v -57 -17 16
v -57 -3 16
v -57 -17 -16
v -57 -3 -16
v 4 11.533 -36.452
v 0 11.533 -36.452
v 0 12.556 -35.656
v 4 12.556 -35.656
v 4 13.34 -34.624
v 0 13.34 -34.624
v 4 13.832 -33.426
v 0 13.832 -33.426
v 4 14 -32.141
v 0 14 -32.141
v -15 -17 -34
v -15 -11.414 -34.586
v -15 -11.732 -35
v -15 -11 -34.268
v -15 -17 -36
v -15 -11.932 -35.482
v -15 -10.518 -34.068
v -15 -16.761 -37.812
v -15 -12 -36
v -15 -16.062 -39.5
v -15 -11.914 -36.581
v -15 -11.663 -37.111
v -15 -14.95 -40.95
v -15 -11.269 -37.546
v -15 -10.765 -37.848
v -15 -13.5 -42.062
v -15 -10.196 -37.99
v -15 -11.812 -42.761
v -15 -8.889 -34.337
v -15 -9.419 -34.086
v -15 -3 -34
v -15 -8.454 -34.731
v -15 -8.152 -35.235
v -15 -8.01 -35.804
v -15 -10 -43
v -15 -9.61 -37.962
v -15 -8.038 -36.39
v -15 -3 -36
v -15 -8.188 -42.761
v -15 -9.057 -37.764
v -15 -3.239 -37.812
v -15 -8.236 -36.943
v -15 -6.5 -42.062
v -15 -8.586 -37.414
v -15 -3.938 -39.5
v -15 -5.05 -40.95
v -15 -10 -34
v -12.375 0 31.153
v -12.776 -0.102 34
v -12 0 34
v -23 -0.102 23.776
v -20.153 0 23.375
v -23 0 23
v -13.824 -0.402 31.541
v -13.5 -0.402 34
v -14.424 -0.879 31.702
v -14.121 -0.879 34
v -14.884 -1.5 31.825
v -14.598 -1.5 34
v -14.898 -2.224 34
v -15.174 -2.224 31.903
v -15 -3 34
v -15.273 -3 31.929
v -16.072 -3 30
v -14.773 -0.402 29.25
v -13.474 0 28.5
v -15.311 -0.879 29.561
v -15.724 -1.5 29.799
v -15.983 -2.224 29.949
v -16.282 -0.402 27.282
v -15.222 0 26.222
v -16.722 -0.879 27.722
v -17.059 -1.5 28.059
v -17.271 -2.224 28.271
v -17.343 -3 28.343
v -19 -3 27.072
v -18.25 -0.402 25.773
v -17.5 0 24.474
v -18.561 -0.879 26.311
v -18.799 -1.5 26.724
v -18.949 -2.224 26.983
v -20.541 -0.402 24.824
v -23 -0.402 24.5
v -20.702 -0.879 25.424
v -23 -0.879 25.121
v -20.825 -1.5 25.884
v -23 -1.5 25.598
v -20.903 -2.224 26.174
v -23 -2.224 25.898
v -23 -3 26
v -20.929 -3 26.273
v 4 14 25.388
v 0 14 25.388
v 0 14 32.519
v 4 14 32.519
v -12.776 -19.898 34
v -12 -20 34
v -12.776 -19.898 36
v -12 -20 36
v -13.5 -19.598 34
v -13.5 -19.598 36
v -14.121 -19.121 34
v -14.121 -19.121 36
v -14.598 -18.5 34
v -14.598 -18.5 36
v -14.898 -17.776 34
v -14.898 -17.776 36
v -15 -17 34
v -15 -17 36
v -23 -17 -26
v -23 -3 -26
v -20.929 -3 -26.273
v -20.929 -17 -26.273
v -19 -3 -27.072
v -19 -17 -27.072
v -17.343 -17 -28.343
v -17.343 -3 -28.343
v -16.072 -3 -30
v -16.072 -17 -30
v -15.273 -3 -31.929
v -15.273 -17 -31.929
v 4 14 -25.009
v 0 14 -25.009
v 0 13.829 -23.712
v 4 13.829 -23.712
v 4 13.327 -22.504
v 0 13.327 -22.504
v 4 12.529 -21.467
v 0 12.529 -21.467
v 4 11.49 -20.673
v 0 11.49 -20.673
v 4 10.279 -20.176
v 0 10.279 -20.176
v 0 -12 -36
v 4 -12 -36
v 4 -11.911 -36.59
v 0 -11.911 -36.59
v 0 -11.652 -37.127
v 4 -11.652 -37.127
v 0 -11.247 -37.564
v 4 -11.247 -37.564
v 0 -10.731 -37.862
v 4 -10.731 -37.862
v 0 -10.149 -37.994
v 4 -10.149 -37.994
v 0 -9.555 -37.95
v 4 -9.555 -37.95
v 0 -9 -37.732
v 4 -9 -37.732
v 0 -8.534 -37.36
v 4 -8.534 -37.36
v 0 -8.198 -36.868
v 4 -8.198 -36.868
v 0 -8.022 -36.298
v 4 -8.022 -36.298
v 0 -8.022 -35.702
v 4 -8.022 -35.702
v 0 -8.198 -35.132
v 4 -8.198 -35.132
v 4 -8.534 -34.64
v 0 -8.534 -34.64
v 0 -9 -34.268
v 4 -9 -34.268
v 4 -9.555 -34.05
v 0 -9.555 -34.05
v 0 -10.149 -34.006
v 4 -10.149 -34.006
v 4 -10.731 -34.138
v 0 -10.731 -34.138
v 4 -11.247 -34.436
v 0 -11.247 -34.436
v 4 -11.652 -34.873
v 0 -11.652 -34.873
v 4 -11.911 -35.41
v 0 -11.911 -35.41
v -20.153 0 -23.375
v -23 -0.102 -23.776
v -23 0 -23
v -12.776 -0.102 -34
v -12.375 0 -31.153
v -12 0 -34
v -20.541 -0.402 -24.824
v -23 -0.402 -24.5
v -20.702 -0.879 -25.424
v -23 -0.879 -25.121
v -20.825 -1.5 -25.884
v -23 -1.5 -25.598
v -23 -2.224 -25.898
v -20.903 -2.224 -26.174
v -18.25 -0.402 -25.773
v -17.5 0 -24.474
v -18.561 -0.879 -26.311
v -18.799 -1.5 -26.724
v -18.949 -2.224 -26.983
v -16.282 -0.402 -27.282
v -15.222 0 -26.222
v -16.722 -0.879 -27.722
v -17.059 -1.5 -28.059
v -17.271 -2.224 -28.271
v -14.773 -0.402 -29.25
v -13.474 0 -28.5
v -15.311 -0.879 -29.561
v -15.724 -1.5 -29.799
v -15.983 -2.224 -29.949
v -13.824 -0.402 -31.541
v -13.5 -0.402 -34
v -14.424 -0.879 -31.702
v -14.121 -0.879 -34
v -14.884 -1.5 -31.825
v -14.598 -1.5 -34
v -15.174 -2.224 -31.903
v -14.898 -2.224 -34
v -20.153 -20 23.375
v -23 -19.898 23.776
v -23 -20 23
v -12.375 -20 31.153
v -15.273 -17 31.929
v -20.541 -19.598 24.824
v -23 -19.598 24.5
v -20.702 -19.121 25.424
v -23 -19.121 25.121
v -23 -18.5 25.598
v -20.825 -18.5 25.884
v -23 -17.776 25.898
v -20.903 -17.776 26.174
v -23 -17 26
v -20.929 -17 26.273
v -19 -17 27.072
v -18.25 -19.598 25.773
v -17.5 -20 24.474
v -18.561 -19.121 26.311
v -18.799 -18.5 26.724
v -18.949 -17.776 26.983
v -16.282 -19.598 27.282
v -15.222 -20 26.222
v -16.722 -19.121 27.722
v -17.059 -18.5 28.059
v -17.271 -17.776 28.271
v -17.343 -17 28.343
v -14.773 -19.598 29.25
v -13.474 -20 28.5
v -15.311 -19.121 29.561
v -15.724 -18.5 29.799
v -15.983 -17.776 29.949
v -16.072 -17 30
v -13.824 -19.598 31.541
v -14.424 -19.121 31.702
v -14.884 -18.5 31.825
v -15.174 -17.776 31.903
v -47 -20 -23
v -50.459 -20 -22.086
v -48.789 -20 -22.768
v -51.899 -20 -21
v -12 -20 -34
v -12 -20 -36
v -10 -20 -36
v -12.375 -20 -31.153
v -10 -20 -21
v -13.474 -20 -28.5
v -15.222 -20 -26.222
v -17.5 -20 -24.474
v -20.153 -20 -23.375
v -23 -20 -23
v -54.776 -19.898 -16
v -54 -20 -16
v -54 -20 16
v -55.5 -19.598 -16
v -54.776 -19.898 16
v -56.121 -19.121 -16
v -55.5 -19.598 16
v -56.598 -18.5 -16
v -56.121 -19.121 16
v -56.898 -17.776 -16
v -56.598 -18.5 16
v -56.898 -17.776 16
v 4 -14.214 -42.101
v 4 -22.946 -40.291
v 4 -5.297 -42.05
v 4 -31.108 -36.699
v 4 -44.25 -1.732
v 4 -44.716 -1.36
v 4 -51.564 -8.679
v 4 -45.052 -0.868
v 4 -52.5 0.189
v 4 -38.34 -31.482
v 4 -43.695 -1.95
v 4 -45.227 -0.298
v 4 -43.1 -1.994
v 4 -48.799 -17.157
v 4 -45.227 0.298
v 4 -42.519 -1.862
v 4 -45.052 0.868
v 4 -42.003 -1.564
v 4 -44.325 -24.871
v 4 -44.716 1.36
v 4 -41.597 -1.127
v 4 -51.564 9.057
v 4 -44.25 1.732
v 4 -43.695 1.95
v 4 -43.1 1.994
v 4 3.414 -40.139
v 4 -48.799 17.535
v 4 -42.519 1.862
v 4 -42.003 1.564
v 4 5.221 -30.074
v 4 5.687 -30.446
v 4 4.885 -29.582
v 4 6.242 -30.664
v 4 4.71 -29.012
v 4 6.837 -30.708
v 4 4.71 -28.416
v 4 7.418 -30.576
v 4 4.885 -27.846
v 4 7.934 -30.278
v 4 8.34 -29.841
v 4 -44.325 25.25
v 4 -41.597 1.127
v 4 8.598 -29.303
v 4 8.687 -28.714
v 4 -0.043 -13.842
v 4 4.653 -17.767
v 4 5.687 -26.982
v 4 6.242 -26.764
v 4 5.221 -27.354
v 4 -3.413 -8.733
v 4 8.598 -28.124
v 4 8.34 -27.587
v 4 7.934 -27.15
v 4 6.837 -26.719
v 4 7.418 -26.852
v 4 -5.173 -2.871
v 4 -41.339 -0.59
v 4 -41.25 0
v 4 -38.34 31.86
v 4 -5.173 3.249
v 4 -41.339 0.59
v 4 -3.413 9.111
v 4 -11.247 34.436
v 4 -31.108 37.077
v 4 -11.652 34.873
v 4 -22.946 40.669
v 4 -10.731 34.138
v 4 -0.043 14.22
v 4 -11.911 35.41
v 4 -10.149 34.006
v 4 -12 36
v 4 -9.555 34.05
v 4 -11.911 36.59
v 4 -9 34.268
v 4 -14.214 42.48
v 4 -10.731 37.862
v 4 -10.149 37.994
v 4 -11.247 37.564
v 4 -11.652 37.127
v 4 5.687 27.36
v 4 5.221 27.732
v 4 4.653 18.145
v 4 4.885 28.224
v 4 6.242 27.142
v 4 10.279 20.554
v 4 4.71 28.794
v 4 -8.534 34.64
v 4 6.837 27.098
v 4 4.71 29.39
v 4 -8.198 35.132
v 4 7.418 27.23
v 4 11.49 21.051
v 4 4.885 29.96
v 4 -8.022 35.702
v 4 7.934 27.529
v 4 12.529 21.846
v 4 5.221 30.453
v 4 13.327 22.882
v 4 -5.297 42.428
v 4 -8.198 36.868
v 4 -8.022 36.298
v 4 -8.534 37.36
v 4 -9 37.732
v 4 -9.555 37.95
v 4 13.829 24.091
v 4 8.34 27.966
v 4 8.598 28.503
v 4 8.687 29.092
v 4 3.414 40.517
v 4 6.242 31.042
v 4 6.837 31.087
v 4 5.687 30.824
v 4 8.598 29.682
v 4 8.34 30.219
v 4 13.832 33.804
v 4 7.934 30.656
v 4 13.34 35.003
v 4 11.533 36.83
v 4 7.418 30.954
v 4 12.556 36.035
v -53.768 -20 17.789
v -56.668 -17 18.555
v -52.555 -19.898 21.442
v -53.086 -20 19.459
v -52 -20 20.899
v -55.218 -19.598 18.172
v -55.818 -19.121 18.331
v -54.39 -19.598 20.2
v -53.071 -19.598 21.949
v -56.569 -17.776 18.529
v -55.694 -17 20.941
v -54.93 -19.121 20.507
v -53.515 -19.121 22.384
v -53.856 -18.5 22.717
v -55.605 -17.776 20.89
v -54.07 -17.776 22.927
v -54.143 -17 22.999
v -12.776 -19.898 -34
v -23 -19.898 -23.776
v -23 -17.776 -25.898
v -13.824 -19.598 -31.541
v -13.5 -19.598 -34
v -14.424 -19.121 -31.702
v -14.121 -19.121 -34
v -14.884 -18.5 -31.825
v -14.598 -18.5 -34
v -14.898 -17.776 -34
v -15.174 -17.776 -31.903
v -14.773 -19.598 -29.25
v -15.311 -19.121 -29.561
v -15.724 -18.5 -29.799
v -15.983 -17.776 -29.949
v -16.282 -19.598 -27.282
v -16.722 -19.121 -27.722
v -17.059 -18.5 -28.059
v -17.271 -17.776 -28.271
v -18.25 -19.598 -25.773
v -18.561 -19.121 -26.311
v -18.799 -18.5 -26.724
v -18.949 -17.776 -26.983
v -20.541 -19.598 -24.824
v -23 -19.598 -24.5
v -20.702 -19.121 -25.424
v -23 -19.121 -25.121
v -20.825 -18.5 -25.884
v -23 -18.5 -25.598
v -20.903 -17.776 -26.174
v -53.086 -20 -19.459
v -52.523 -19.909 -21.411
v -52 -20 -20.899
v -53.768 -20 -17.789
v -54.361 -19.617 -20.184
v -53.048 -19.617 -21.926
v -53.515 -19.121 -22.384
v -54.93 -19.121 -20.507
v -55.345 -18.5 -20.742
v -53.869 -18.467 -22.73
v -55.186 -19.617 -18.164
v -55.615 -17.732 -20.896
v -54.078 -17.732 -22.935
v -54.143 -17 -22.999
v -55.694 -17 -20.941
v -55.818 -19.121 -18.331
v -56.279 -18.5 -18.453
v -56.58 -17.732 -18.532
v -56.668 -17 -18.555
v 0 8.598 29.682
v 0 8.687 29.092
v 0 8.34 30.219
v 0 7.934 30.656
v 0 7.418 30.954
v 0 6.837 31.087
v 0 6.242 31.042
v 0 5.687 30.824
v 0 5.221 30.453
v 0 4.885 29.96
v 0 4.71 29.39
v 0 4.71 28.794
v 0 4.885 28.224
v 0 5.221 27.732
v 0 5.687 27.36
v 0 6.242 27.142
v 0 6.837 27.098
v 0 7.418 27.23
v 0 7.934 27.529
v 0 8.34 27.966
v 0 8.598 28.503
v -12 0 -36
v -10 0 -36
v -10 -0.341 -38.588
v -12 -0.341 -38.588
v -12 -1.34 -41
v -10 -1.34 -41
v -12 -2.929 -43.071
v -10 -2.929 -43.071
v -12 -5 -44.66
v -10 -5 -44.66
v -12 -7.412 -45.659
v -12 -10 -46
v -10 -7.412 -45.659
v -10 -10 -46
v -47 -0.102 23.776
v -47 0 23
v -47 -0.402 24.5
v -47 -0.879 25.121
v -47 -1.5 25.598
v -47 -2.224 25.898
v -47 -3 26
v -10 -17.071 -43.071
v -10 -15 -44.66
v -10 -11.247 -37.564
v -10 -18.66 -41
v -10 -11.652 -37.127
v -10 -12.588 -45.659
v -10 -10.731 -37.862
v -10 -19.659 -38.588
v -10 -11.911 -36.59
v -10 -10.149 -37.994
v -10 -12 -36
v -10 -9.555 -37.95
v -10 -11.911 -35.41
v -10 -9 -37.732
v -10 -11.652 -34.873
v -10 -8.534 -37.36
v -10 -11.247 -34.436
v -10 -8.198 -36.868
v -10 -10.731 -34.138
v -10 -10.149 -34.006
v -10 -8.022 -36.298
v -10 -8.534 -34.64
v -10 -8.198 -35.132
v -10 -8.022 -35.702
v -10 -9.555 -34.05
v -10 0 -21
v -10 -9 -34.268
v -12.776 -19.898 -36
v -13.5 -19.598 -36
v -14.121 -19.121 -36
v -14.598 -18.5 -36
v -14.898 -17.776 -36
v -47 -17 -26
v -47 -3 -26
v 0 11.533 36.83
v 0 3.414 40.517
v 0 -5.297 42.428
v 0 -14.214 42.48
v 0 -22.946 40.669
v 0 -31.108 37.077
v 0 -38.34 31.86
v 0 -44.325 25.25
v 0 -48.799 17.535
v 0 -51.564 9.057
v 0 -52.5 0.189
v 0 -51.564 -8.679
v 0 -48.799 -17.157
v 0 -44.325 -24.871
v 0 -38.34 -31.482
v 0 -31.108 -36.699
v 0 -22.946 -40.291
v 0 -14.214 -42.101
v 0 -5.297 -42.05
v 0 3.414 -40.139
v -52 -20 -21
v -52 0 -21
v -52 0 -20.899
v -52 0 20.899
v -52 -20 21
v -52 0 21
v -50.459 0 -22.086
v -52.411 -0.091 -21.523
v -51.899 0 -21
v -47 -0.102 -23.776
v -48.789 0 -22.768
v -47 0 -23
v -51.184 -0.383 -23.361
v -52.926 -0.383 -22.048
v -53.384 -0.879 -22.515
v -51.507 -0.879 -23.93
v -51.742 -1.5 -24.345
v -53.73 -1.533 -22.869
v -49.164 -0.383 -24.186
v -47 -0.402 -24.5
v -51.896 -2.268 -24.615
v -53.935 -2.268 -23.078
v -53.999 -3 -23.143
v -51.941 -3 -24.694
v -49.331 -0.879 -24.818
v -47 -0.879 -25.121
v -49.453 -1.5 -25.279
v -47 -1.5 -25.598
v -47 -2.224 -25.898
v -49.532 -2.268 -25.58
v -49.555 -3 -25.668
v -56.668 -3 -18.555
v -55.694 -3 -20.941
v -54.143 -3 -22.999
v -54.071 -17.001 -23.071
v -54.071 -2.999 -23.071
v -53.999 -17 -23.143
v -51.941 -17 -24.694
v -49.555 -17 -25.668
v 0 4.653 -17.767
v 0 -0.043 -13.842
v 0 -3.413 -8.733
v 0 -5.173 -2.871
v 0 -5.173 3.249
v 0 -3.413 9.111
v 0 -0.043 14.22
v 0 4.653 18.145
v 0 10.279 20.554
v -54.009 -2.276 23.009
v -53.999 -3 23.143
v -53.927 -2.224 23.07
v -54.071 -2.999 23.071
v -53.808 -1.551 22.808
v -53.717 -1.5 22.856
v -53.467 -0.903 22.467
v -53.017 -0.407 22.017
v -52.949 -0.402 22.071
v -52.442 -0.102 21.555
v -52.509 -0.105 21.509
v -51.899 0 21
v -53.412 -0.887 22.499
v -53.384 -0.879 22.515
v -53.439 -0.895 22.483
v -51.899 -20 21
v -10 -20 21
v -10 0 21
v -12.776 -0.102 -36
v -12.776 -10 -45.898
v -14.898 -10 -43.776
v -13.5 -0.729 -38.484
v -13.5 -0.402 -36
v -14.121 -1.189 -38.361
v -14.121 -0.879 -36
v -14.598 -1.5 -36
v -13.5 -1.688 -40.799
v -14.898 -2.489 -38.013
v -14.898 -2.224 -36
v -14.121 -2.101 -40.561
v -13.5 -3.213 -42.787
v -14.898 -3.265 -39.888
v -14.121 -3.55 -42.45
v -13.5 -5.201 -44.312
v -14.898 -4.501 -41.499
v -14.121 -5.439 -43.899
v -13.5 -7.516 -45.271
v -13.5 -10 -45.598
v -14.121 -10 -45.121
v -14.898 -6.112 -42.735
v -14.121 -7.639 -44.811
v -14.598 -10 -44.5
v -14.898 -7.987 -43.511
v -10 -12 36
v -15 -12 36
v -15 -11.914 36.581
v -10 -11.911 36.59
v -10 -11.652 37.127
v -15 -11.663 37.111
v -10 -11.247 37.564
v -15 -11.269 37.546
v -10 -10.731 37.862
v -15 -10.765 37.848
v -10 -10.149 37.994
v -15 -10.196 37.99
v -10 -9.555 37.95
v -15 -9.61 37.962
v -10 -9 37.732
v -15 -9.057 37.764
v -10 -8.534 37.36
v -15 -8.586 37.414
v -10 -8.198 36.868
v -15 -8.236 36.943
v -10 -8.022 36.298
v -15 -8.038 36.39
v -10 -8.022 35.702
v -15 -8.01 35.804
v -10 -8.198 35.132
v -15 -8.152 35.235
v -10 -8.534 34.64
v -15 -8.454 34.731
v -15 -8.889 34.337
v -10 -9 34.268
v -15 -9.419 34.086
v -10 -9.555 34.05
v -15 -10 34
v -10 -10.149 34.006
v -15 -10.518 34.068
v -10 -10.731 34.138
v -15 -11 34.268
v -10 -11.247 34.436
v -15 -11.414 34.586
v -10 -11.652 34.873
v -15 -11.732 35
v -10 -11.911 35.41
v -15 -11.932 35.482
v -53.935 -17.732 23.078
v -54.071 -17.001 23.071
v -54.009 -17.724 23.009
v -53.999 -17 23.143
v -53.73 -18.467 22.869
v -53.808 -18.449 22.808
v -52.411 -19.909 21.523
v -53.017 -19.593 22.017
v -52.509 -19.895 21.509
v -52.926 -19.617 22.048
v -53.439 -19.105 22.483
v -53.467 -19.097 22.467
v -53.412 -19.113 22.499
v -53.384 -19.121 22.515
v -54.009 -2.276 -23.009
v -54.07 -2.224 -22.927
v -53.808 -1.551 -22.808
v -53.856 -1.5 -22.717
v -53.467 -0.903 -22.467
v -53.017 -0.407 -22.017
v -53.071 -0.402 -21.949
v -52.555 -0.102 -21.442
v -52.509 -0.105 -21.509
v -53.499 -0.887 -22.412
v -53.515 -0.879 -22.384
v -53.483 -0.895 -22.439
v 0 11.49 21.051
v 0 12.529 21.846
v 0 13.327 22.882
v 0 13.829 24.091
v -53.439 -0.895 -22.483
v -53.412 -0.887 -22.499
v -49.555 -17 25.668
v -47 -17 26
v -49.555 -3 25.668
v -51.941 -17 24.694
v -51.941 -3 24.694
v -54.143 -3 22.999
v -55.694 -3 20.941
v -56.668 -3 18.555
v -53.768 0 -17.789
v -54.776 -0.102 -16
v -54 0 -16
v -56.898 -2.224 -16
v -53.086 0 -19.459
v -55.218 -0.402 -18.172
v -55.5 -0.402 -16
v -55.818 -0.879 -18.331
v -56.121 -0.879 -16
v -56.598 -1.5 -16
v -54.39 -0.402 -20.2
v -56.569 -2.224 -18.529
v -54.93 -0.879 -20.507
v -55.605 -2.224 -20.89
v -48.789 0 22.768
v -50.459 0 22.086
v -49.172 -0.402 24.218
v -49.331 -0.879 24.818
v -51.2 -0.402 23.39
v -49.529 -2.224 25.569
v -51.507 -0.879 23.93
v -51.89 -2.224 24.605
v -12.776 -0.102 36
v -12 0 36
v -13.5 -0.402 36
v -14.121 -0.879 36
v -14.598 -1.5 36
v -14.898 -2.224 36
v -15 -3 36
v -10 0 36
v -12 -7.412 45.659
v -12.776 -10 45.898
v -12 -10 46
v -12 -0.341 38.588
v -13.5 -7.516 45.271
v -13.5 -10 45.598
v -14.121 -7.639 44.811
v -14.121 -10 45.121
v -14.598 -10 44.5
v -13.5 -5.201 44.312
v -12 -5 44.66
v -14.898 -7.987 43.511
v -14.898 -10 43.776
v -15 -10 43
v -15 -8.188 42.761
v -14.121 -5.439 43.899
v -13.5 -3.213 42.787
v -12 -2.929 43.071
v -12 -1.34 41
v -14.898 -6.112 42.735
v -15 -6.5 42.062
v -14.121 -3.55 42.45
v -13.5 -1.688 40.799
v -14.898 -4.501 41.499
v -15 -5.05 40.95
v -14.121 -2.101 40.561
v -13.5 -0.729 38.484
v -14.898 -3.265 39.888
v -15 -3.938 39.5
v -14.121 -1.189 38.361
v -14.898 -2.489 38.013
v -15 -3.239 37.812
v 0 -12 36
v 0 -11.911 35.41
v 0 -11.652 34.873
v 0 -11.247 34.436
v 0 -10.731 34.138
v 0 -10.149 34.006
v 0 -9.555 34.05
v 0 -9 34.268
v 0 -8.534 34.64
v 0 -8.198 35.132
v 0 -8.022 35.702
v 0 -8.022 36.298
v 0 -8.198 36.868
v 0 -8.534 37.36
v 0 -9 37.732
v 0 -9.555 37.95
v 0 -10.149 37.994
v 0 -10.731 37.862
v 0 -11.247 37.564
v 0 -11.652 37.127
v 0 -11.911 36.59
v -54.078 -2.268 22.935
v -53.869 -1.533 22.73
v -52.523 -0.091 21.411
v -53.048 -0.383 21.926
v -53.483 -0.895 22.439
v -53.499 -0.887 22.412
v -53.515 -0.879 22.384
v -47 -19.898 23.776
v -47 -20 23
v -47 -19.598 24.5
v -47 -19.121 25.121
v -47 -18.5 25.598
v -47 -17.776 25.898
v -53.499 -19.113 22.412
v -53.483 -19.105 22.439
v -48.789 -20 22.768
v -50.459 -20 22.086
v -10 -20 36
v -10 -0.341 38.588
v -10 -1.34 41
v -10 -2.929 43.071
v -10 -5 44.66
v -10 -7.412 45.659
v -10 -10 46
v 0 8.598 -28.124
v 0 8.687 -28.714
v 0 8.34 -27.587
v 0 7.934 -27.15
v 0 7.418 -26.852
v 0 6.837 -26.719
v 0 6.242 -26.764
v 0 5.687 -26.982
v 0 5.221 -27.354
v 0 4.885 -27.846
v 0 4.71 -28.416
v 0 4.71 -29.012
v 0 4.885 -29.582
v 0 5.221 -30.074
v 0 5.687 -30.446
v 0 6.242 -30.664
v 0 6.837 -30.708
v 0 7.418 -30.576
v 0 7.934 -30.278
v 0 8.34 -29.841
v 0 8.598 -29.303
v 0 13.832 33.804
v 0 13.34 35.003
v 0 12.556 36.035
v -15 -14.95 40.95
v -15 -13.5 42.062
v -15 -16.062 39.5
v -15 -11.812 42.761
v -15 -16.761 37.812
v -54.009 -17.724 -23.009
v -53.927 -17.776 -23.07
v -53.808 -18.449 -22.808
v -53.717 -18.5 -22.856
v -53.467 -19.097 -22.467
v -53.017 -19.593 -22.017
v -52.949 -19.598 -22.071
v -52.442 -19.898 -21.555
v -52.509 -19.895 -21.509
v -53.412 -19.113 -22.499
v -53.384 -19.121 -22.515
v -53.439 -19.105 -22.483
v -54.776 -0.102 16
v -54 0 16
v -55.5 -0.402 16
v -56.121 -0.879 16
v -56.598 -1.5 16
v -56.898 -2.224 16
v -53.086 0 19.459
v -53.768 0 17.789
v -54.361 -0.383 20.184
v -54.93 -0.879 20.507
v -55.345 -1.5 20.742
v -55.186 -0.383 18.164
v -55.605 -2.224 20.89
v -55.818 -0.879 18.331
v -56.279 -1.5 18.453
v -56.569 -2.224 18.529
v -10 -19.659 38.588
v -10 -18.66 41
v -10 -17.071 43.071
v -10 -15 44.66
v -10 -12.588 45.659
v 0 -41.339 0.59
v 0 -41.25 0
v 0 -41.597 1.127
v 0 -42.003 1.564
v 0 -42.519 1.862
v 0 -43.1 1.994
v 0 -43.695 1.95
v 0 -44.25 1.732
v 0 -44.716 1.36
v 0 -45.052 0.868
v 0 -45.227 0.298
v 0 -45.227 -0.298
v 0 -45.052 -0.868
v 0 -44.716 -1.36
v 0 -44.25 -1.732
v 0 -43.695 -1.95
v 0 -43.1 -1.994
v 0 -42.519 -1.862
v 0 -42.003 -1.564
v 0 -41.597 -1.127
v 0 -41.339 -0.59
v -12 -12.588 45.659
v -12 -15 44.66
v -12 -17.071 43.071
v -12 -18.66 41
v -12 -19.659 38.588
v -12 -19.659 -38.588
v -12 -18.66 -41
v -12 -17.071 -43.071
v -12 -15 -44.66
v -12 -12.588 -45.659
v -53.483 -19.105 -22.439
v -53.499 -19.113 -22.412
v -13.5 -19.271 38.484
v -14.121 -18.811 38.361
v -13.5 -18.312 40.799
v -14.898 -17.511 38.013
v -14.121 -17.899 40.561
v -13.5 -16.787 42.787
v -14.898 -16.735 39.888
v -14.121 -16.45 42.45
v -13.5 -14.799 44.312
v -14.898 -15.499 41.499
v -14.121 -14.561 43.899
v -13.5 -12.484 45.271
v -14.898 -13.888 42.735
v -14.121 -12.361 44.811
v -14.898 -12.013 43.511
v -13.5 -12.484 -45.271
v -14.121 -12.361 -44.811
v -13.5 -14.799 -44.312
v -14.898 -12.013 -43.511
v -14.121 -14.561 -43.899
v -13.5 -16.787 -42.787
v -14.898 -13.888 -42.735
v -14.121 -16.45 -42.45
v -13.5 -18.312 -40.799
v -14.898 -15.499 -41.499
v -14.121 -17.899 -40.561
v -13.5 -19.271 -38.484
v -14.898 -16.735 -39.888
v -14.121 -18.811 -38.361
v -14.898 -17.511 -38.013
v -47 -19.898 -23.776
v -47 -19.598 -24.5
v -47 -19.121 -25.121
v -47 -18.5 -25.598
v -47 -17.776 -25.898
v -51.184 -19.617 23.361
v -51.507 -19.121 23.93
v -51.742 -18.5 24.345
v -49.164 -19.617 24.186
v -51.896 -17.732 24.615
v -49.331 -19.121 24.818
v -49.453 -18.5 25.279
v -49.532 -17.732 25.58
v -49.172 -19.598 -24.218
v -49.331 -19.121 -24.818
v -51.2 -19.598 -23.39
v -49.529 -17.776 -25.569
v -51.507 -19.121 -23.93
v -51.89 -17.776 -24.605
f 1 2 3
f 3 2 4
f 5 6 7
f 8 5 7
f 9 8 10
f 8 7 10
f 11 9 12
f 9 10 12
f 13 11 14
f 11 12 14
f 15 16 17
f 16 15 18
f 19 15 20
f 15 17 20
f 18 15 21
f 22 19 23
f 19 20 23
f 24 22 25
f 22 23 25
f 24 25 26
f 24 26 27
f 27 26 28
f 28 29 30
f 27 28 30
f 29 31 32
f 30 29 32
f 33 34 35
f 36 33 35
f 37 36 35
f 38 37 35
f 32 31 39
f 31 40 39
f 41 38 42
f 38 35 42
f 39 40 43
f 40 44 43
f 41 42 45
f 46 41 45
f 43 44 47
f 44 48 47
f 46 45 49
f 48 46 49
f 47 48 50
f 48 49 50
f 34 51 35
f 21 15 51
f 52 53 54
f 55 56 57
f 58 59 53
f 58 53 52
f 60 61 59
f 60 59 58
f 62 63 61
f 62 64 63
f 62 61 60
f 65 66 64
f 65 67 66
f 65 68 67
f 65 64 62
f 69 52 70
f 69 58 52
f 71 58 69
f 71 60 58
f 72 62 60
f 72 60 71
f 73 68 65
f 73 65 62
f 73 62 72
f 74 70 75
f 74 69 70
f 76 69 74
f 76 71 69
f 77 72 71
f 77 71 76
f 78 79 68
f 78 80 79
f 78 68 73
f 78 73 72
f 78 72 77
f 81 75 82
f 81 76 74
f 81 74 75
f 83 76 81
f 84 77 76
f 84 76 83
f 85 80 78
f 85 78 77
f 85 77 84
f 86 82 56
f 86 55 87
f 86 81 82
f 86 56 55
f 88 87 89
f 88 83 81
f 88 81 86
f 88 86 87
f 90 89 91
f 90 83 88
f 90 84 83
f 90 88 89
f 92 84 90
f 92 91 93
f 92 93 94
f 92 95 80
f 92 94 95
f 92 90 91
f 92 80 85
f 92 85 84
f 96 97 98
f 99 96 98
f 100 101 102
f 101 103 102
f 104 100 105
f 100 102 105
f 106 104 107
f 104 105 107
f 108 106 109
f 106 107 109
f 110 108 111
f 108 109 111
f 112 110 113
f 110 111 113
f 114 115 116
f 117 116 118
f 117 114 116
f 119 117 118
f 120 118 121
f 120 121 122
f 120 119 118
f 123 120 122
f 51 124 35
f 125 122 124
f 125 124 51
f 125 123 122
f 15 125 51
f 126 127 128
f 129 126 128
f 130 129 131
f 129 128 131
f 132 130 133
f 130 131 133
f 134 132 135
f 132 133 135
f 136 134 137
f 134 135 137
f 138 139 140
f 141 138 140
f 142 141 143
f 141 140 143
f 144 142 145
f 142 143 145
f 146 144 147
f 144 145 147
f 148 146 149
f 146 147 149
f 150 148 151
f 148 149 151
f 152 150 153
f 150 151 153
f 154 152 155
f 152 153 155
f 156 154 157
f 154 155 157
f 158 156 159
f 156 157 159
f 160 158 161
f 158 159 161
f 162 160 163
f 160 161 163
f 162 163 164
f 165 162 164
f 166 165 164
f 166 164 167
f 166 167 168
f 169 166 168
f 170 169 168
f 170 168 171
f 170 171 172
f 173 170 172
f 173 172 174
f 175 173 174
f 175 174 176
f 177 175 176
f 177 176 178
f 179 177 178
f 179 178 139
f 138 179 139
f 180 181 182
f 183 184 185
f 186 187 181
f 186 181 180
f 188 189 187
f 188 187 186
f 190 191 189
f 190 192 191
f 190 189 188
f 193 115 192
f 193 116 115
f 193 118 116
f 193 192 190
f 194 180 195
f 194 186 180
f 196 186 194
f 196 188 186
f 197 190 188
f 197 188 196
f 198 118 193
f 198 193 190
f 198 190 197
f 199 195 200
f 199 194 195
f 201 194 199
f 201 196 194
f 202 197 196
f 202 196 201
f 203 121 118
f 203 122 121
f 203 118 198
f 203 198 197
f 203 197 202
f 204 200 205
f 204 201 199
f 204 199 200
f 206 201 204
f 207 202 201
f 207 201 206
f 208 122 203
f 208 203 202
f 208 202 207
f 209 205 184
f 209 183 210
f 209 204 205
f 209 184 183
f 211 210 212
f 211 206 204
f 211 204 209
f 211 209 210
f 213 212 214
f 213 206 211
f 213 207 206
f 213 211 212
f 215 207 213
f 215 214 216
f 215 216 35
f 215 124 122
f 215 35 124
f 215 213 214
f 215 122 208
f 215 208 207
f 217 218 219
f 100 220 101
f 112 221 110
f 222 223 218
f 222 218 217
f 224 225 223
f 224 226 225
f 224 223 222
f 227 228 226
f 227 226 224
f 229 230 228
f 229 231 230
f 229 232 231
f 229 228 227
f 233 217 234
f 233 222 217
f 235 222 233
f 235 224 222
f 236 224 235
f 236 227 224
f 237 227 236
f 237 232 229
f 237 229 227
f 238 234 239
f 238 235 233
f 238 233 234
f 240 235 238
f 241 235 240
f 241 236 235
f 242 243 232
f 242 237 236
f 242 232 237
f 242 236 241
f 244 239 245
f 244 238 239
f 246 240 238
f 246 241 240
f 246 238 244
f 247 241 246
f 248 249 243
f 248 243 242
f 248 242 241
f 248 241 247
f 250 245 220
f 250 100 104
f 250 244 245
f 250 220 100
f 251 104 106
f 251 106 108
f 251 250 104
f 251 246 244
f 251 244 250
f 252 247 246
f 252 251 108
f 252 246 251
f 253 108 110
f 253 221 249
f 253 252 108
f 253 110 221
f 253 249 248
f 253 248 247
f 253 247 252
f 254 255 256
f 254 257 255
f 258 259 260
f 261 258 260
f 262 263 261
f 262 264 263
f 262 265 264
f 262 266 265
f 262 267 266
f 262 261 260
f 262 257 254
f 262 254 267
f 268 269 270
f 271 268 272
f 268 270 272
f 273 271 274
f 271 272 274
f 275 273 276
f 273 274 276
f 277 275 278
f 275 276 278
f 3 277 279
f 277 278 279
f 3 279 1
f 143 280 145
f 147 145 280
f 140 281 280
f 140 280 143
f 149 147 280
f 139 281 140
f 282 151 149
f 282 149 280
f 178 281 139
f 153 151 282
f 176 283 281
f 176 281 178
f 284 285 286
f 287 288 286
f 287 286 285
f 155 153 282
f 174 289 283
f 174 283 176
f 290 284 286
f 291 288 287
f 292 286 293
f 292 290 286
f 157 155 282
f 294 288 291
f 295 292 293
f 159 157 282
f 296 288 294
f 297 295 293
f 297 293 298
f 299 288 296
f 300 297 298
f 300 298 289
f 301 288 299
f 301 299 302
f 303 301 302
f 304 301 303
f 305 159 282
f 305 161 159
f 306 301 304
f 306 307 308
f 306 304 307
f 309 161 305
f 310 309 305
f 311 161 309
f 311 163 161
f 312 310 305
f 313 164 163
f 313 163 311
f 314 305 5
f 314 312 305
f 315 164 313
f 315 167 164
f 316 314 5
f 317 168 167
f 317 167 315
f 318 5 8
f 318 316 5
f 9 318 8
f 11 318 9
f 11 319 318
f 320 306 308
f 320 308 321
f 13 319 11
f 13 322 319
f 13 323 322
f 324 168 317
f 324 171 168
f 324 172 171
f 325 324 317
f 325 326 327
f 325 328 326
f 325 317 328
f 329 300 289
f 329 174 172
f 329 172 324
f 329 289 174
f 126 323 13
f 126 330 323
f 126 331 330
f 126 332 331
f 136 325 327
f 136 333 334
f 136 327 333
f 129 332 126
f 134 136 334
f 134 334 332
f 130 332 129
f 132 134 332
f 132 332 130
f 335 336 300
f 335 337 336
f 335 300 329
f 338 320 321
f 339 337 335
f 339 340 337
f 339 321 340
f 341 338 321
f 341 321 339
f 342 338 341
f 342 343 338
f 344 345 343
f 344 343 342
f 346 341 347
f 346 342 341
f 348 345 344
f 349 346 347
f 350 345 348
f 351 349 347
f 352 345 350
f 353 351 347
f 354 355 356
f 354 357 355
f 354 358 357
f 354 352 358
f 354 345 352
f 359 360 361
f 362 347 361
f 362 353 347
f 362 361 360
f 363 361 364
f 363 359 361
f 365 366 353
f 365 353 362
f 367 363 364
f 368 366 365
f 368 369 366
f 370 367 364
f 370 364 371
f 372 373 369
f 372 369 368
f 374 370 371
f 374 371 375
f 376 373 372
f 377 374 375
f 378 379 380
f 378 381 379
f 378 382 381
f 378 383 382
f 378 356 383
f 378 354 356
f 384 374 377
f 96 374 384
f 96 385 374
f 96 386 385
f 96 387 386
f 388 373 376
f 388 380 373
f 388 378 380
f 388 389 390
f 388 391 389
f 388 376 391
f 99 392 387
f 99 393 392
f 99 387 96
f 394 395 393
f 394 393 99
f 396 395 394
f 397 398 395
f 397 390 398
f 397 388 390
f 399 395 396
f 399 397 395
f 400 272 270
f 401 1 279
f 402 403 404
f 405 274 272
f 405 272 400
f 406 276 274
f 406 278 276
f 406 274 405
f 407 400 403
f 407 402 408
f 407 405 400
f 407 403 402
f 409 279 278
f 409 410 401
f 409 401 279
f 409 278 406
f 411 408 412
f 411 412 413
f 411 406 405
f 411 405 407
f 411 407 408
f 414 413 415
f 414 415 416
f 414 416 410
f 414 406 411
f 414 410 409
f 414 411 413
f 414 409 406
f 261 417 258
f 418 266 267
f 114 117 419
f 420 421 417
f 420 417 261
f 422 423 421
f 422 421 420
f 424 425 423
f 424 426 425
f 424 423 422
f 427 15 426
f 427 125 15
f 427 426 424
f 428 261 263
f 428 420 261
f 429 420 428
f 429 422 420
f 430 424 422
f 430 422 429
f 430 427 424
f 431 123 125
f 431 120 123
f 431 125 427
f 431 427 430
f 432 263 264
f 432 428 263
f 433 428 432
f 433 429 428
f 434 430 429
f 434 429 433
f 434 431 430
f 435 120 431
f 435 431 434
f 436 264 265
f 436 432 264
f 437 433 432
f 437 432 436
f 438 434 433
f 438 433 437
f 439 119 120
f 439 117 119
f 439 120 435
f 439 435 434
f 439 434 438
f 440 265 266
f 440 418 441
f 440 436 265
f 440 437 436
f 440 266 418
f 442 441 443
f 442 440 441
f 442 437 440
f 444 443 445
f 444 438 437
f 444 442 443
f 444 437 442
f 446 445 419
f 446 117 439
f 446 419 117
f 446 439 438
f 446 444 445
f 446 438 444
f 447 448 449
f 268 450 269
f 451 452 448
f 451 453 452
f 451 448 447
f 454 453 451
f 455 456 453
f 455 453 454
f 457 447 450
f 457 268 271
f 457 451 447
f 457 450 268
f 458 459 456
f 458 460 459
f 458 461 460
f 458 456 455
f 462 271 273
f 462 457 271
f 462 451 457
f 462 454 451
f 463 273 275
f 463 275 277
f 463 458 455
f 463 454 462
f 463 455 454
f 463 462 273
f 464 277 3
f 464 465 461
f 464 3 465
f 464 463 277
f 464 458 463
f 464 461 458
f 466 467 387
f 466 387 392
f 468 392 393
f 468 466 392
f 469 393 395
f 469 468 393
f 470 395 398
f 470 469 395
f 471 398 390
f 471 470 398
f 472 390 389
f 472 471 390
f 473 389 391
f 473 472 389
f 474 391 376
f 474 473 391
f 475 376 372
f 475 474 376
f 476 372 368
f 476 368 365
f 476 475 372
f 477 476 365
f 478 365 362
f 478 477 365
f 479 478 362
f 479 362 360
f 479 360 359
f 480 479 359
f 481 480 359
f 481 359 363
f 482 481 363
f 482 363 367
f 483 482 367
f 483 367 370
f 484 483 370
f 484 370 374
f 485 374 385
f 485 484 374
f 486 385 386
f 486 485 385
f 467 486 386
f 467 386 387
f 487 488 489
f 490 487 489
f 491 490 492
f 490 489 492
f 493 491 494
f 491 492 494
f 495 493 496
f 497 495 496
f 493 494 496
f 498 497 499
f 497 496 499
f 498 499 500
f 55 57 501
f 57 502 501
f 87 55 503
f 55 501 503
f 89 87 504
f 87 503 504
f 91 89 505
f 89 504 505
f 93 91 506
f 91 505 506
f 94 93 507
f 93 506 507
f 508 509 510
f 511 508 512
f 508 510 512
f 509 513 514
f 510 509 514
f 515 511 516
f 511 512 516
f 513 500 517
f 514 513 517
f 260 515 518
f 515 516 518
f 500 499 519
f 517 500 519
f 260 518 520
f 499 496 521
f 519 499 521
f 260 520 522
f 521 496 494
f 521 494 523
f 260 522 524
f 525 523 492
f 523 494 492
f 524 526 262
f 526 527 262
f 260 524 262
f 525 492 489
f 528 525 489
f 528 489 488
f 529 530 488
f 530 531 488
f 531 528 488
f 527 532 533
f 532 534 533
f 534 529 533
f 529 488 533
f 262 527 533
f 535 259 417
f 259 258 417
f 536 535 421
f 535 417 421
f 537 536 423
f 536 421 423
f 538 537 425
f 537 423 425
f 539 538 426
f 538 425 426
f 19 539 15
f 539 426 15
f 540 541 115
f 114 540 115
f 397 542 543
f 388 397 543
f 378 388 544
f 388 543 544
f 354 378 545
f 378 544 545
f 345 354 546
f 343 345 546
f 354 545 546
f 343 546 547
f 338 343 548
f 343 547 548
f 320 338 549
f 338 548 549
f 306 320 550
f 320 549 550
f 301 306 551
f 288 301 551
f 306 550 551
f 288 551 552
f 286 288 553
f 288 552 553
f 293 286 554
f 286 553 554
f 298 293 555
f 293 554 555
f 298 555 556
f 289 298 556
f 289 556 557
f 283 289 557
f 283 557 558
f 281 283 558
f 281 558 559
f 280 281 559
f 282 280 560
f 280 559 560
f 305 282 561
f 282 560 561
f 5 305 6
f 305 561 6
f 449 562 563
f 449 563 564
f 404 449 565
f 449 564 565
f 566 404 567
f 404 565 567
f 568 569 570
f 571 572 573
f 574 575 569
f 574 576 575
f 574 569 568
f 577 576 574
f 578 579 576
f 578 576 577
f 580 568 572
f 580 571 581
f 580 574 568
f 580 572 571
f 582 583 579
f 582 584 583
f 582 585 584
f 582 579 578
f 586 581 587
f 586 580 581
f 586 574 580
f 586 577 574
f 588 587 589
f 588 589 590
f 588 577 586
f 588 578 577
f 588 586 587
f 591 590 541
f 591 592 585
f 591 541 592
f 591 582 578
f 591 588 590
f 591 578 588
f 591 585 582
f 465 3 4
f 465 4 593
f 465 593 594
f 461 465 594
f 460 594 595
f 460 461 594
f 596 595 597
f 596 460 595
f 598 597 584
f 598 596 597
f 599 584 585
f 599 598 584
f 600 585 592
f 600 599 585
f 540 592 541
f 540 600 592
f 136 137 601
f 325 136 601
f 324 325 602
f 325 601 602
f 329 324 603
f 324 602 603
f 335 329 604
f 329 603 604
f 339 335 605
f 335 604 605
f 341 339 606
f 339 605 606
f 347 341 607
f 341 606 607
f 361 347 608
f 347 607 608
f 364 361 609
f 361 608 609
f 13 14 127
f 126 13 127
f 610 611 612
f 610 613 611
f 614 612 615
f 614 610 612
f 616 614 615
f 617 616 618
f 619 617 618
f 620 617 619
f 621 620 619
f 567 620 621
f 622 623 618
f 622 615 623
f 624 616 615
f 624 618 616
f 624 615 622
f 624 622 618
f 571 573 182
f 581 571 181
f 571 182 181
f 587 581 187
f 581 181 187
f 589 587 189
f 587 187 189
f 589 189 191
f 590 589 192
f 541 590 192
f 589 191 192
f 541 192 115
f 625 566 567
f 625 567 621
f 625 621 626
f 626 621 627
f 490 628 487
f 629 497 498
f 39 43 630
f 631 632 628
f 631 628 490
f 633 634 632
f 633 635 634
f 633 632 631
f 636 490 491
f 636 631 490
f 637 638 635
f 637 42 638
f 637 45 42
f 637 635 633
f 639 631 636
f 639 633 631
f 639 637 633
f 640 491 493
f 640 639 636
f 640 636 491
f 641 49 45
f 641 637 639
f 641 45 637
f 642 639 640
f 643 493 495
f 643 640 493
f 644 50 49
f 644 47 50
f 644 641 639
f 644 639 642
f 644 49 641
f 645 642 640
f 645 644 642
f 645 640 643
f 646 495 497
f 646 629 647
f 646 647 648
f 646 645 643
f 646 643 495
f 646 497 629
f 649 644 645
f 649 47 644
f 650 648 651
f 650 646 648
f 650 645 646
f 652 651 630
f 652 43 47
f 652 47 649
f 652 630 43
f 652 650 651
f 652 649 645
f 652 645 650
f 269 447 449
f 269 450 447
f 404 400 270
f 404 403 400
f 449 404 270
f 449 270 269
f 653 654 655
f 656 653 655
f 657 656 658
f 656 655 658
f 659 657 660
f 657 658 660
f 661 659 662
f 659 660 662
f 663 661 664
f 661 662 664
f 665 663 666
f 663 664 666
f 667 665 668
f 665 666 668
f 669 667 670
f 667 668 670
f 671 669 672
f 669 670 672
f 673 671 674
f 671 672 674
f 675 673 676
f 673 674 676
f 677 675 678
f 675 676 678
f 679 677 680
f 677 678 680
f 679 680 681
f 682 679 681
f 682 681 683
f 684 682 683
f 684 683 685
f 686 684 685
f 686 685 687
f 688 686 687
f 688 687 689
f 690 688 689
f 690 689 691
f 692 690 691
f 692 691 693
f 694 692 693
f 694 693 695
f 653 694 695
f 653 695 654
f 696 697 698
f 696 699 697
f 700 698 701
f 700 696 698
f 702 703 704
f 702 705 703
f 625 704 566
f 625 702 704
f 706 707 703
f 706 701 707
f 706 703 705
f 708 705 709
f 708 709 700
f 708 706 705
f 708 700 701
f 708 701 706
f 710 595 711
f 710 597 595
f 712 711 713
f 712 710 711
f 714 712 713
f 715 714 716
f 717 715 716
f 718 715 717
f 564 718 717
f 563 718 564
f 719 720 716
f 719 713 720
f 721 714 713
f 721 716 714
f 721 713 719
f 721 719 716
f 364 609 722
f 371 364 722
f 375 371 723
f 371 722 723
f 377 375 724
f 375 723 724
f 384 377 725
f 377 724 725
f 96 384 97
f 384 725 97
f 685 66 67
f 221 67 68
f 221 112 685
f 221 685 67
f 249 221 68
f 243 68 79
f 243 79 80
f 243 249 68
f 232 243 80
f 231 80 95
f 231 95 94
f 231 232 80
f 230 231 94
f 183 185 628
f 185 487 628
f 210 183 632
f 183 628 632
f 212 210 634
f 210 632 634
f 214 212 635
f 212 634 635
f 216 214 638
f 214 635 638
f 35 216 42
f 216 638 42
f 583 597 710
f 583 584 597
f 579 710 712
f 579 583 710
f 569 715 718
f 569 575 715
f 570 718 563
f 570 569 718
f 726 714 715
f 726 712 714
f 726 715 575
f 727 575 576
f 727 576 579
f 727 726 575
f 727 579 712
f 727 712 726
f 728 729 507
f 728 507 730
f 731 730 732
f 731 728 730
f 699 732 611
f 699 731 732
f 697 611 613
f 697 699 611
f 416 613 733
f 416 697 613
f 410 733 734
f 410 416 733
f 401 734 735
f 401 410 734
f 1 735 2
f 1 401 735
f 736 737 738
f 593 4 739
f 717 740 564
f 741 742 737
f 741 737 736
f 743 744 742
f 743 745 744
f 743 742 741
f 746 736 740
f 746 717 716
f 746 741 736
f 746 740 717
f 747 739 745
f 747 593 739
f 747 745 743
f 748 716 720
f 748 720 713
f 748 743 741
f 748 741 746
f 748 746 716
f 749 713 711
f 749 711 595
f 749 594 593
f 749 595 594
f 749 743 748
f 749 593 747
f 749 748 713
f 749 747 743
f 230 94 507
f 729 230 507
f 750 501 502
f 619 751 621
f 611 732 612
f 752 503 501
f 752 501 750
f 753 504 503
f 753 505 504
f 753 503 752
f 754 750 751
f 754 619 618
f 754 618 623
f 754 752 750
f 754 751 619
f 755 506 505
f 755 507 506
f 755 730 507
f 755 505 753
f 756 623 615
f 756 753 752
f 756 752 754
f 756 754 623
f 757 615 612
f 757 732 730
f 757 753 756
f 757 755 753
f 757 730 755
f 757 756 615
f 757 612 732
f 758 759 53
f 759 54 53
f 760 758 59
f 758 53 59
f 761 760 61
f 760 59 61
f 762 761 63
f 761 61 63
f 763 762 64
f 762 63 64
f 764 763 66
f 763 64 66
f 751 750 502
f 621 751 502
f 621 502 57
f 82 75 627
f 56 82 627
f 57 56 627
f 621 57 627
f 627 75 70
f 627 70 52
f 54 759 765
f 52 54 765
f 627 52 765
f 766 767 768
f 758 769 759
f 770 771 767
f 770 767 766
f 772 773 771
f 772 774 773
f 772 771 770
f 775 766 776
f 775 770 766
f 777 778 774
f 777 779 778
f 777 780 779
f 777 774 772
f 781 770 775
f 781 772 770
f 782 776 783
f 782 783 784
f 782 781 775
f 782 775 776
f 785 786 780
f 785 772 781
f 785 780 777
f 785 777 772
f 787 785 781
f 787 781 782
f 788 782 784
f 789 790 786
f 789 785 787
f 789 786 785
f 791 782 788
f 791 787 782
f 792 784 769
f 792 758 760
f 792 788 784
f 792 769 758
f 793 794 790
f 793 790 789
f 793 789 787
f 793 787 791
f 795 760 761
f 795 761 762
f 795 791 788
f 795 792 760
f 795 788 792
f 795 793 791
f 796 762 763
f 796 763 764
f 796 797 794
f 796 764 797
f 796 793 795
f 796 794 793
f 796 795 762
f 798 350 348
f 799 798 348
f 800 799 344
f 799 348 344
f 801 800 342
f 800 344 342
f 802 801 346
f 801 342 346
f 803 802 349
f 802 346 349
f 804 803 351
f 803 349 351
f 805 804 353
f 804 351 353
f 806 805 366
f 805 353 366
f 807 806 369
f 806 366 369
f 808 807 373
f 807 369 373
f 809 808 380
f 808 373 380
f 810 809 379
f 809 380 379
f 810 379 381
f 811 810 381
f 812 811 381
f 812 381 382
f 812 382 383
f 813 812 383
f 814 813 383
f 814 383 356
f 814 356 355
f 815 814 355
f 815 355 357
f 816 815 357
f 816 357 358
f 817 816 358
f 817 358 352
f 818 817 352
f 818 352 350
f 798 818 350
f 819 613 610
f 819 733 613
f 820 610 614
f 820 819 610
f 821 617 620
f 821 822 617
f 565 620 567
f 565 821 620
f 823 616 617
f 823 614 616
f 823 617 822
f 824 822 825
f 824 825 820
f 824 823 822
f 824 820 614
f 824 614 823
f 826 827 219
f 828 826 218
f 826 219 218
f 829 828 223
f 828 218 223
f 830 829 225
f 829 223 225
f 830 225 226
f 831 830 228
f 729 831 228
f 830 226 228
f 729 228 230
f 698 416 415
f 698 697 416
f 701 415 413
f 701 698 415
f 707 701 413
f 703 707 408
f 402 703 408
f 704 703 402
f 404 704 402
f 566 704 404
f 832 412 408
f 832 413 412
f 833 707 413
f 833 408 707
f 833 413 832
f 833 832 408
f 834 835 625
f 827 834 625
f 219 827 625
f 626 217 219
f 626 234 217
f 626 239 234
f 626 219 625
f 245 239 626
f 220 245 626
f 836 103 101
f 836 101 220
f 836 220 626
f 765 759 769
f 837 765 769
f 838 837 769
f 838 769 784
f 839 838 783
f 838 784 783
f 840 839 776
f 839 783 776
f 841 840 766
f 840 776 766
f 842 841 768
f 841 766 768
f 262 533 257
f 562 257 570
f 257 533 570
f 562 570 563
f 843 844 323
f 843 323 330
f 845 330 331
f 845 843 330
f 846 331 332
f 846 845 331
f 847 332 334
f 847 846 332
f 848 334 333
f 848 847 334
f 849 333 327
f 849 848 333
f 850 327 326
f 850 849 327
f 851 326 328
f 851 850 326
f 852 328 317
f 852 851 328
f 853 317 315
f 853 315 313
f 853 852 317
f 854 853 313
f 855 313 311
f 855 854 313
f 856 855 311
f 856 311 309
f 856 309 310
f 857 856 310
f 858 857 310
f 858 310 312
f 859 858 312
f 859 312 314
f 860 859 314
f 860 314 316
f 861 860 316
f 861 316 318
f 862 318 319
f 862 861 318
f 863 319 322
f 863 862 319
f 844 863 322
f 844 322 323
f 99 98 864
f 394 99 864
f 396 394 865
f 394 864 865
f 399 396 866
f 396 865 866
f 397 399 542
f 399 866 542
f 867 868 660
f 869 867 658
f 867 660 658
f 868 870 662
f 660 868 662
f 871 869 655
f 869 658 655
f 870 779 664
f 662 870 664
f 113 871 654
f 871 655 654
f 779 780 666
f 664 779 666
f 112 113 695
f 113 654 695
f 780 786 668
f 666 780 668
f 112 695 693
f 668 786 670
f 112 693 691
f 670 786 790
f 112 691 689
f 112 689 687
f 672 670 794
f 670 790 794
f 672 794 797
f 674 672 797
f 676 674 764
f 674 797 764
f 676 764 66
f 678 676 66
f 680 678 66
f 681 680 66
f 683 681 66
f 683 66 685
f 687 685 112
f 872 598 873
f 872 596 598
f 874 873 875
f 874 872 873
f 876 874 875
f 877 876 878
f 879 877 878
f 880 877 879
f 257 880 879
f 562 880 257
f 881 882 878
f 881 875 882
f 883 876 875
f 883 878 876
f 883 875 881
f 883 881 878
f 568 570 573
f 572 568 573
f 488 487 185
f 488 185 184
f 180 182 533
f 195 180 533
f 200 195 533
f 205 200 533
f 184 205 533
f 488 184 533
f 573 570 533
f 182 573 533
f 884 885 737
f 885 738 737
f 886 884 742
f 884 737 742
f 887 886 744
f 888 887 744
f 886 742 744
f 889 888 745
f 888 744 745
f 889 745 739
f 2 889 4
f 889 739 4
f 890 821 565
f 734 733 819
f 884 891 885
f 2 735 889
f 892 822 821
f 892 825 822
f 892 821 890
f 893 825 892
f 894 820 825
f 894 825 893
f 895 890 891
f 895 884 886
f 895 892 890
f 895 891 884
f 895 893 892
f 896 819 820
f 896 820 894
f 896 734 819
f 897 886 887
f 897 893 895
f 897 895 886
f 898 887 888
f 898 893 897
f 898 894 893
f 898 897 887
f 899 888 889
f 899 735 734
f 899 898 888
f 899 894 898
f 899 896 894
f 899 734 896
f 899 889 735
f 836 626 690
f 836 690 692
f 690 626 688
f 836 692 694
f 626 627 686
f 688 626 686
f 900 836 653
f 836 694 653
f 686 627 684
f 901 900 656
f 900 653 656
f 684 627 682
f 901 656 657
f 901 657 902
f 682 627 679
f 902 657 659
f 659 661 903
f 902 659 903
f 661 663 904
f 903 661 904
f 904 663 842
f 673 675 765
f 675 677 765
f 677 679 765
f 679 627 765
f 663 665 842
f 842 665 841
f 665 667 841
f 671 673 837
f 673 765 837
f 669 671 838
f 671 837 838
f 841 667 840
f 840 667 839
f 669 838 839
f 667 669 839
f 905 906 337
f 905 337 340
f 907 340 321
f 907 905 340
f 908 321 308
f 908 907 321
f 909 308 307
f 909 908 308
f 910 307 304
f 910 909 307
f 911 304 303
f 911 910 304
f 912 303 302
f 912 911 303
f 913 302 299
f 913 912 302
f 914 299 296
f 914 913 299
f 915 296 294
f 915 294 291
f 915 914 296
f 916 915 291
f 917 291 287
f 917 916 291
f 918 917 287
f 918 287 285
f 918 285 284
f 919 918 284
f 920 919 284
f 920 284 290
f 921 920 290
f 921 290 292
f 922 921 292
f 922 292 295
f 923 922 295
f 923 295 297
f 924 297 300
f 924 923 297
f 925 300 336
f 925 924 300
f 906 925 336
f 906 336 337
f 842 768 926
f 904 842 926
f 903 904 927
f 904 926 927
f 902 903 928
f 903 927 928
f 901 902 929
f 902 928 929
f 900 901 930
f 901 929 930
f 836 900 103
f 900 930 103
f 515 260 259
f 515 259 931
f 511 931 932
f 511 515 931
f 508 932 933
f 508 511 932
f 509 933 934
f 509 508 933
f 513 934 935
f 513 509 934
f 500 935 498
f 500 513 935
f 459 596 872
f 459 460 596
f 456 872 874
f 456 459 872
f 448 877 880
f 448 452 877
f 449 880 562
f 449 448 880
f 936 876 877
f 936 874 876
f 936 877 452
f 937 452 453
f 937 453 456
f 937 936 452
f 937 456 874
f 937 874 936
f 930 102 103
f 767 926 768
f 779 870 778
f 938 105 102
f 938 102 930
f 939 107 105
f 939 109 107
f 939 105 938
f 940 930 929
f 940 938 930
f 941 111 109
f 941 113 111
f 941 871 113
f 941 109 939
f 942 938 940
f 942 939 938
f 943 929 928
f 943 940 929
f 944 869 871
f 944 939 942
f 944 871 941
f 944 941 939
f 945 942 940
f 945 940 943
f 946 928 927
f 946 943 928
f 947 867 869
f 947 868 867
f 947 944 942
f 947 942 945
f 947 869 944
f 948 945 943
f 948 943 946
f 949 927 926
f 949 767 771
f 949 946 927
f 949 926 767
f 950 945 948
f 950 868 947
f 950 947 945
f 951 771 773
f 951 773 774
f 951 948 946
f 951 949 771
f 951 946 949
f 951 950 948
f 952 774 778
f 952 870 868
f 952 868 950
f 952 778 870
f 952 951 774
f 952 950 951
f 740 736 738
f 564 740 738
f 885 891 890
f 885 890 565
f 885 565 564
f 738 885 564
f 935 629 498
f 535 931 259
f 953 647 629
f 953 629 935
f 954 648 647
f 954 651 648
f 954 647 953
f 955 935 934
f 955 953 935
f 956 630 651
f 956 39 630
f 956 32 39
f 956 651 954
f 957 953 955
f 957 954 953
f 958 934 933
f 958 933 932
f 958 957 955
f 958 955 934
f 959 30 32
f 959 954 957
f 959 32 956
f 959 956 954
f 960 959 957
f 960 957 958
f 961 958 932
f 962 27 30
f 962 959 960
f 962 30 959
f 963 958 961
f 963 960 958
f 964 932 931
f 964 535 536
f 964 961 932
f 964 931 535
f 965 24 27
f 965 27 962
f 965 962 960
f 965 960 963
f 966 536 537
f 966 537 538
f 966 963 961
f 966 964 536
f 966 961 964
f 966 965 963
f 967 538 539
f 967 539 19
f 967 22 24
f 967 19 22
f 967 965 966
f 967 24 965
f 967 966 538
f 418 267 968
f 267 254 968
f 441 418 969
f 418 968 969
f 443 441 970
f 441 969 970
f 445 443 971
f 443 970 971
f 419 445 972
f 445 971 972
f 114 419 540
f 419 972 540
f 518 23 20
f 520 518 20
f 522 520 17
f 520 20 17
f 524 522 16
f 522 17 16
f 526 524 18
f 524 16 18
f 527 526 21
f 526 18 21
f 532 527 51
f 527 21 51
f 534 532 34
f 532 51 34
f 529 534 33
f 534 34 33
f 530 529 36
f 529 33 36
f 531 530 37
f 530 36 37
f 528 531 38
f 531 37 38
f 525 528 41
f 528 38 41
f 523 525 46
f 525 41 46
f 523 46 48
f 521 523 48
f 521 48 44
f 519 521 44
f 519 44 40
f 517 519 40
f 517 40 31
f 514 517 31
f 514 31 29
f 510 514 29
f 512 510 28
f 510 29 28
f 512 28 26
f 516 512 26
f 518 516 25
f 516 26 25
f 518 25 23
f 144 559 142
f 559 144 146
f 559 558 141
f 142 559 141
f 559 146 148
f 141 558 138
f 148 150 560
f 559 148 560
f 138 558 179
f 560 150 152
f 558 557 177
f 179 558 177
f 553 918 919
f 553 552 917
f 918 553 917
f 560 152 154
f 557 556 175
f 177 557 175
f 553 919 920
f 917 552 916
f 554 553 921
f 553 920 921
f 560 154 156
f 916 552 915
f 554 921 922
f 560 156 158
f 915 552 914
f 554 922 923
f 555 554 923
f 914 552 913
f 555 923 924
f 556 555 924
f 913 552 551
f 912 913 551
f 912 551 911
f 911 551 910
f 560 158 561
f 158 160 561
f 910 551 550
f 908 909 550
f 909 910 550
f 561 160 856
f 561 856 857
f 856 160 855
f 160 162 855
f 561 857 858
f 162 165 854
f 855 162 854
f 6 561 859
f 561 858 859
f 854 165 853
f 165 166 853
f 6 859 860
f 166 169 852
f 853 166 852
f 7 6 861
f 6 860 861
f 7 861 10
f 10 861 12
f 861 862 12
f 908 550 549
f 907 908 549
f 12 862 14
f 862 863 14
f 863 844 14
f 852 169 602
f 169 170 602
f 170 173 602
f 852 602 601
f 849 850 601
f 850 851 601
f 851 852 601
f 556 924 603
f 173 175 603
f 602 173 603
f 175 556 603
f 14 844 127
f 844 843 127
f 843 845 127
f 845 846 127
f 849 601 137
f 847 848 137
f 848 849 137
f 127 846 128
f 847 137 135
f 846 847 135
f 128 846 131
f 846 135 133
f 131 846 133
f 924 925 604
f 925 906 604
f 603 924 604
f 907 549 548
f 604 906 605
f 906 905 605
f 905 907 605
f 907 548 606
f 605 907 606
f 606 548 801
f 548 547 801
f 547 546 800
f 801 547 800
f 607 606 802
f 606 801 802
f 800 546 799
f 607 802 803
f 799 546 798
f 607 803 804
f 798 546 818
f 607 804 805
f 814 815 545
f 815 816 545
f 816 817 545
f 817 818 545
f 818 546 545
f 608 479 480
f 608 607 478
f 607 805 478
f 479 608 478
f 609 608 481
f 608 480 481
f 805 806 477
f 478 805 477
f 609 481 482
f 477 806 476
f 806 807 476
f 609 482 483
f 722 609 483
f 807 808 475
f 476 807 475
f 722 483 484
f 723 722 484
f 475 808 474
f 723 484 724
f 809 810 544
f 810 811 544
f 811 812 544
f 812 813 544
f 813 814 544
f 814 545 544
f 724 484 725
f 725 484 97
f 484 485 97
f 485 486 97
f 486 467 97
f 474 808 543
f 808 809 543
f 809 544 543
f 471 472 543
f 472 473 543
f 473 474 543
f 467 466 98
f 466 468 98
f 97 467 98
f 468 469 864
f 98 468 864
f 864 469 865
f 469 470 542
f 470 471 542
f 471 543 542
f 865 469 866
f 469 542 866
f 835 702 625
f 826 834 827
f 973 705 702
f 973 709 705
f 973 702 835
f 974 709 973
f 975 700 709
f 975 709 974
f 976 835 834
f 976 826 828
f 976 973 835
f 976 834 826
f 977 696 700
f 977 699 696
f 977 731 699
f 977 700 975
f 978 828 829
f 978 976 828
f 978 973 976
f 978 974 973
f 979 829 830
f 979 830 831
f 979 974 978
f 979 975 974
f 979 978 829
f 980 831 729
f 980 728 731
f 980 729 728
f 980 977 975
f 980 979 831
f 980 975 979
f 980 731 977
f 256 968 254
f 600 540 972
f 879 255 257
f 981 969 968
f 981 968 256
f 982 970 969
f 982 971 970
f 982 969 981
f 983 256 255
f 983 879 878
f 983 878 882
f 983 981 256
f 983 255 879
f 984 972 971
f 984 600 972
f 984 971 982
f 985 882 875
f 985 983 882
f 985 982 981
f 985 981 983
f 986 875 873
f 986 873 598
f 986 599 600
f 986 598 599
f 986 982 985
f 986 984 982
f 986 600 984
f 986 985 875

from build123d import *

# Parameters (mm, degrees)
F1_DEPTH    = 20
F2_R        = 8
F3_R        = 9.99999
F4_R        = 3
F7_R        = 2
F8_DEPTH    = 4
F9_D        = 4
F9_ON_F5_D  = 4
F10_D       = 4
F10_ON_F5_D = 4


# Not quite as in the source:
# - a fillet or chamfer is up to 0.001 mm smaller than in the source, because OpenCascade refuses the exact size


with BuildPart() as f1:
    # F0 (on Front) → F1 (new body)
    with BuildSketch(Plane.XZ):
        Polygon((-52, 21), (-10, 21), (-10, 46), (-15, 46), (-15, 26), (-57, 26), (-57, -26), (-15, -26), (-15, -46), (-10, -46), (-10, -21), (-52, -21), align=None)
    extrude(amount=F1_DEPTH)

    # F2
    f2_edges = [f1.edges().sort_by_distance(p)[0] for p in [
        (-15, -10, -26),
        (-15, -10, 26),
    ]]
    fillet(f2_edges, radius=F2_R)

    # F3 (radius 10 in the source; OpenCascade refuses exactly that, so slightly less here)
    f3_edges = [f1.edges().sort_by_distance(p)[0] for p in [
        (-12.5, 0, 46),
        (-12.5, -20, 46),
        (-12.5, 0, -46),
        (-12.5, -20, -46),
        (-57, -10, -26),
        (-57, -10, 26),
    ]]
    fillet(f3_edges, radius=F3_R)

    # F4
    f4_edges = [f1.edges().sort_by_distance(p)[0] for p in [
        (-57, 0, 0),
    ]]
    fillet(f4_edges, radius=F4_R)

    # F9 (through all)
    with Locations(Plane.YZ.offset(-10)):
        with Locations((-10, -36)):
            Hole(F9_D / 2)

    # F9 on F5 (through all)
    with Locations(Plane.YZ.offset(-10)):
        with Locations((-10, 36)):
            Hole(F9_ON_F5_D / 2)


with BuildPart() as f8:
    # F7 (on Right) → F8 (new body)
    with BuildSketch(Plane.YZ):
        with BuildLine():
            ThreePointArc((14, 32.5194938452), (13.3397388554, 35.0027712494), (11.5333333333, 36.8302040212))
            ThreePointArc((11.5333333333, 36.8302040212), (-52.5, 0.1891675245), (11.5333333333, -36.4518689722))
            ThreePointArc((11.5333333333, -36.4518689722), (13.3397388554, -34.6244362004), (14, -32.1411587962))
            Line((14, -32.1411587962), (14, -25.009258036))
            ThreePointArc((14, -25.009258036), (12.9621576699, -21.9594536818), (10.2794773604, -20.1757357505))
            ThreePointArc((10.2794773604, -20.1757357505), (-5.3960650728, 0.1891675245), (10.2794773604, 20.5540707995))
            ThreePointArc((10.2794773604, 20.5540707995), (12.9621576699, 22.3377887308), (14, 25.387593085))
            Line((14, 25.387593085), (14, 32.5194938452))
        make_face()
        with Locations((-43.2497895028, 0)):
            Circle(F7_R, mode=Mode.SUBTRACT)
        with Locations((6.6871778265, -28.7138723059)):
            Circle(F7_R, mode=Mode.SUBTRACT)
        with Locations((6.6871778265, 29.0922073549)):
            Circle(F7_R, mode=Mode.SUBTRACT)
    extrude(amount=F8_DEPTH)

    # F10 (through all)
    with Locations(Plane(origin=(-10, 0, 0), x_dir=(0, 1, 0), z_dir=(-1, 0, 0))):
        with Locations((-10, 36)):
            Hole(F10_D / 2)

    # F10 on F5 (through all)
    with Locations(Plane(origin=(-10, 0, 0), x_dir=(0, 1, 0), z_dir=(-1, 0, 0))):
        with Locations((-10, -36)):
            Hole(F10_ON_F5_D / 2)


solid = Compound([f1.part, f8.part])
